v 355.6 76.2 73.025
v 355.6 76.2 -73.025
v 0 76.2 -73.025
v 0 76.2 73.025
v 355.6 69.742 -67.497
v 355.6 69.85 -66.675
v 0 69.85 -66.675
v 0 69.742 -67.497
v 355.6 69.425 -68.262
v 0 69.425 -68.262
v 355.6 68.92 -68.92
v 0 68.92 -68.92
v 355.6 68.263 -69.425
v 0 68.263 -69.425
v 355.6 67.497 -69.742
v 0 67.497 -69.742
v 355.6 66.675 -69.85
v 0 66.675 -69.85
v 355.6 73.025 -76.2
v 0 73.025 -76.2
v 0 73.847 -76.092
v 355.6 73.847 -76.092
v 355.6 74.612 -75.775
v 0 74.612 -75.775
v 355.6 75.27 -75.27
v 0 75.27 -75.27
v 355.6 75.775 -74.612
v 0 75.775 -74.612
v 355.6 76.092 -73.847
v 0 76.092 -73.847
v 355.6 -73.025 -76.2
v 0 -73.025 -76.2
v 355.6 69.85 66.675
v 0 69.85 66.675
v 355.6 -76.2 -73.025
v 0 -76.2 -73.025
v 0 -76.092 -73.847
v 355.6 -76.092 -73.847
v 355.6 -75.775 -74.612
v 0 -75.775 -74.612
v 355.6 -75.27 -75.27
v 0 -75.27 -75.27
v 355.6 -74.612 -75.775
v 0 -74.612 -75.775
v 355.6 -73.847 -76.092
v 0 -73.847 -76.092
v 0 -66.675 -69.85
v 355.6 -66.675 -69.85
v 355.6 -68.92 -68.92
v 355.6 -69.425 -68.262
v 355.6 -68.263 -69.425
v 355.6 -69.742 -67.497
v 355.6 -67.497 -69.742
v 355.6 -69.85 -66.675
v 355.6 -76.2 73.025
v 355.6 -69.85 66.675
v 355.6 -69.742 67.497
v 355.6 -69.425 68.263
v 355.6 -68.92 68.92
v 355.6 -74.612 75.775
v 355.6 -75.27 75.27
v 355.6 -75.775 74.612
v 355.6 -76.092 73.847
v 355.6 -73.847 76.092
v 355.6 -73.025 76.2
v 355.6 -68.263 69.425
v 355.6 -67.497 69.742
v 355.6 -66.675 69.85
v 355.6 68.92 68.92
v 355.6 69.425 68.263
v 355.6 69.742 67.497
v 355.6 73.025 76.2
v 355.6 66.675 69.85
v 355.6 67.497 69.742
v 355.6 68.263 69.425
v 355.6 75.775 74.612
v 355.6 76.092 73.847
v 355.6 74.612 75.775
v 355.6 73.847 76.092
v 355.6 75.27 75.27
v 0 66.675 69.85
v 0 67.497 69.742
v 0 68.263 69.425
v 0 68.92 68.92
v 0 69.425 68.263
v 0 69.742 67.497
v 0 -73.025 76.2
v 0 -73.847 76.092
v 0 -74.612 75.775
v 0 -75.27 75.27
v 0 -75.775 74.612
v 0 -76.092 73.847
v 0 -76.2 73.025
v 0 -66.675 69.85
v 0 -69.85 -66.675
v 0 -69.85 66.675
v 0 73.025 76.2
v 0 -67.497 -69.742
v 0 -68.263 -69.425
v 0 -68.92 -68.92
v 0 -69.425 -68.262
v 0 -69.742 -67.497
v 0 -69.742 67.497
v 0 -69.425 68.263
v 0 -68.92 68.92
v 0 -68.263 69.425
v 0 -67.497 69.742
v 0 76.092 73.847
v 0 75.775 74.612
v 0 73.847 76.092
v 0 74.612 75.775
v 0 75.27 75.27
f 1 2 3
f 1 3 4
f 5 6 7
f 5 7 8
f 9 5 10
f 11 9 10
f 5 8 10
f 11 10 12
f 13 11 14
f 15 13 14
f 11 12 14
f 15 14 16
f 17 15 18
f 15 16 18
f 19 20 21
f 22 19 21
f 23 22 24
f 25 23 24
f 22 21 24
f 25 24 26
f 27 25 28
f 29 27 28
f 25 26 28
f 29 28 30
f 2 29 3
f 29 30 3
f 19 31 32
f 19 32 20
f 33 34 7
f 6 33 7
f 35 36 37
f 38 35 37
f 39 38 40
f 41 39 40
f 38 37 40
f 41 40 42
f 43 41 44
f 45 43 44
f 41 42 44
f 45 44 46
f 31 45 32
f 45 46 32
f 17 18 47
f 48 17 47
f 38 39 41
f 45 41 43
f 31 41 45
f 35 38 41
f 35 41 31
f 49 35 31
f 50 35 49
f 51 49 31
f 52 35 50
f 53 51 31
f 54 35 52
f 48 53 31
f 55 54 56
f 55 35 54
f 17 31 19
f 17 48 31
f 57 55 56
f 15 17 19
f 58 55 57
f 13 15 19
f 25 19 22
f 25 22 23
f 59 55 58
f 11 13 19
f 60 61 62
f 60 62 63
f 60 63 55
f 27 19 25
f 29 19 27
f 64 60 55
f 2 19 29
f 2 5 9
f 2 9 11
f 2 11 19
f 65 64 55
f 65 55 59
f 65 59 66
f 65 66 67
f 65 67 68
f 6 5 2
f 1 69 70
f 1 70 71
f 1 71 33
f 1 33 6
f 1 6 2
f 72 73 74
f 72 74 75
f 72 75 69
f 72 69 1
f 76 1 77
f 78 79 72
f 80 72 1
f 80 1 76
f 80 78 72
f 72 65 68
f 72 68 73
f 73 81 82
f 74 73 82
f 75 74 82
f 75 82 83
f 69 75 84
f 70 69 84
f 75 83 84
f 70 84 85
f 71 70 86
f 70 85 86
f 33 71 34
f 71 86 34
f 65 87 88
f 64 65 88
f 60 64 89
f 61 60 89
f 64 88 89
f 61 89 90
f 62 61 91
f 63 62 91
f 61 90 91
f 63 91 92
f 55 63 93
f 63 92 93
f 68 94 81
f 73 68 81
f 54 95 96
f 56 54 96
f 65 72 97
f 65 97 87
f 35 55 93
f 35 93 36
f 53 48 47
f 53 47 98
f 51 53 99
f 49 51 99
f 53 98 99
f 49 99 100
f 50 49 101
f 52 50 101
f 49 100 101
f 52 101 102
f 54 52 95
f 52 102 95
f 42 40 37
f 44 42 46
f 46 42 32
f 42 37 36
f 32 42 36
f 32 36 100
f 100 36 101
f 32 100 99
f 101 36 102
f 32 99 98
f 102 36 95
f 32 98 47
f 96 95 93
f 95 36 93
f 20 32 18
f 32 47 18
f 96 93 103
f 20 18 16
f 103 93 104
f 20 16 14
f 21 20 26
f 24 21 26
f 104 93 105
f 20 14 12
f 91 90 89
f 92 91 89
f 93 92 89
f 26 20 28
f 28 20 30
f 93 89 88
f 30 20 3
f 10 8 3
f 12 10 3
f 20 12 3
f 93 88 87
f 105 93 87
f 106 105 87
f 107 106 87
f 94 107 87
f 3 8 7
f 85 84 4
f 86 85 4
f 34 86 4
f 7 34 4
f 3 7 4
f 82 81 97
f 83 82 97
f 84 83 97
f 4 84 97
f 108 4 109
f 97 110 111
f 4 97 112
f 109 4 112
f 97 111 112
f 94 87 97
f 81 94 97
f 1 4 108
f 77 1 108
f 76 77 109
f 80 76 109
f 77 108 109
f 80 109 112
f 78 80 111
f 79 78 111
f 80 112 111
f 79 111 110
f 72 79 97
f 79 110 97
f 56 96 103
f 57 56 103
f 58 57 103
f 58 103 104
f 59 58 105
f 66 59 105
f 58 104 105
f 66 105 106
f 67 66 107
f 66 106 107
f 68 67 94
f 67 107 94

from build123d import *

# Parameters (mm, degrees)
F1_DEPTH = 355.6


with BuildPart() as f1:
    # F0 (on Right) → F1 (new body)
    with BuildSketch(Plane.YZ):
        with BuildLine():
            Line((73.025, 76.2), (-73.025, 76.2))
            ThreePointArc((-73.025, 76.2), (-75.270064, 75.270064), (-76.2, 73.025))
            Line((-76.2, 73.025), (-76.2, -73.025))
            ThreePointArc((-76.2, -73.025), (-75.270064, -75.270064), (-73.025, -76.2))
            Line((-73.025, -76.2), (73.025, -76.2))
            ThreePointArc((73.025, -76.2), (75.270064, -75.270064), (76.2, -73.025))
            Line((76.2, -73.025), (76.2, 73.025))
            ThreePointArc((76.2, 73.025), (75.270064, 75.270064), (73.025, 76.2))
        make_face()
        with BuildLine():
            Line((-69.850001, -66.674999), (-69.850001, 66.675001))
            ThreePointArc((-69.850001, 66.675001), (-68.920065, 68.920065), (-66.675001, 69.850001))
            Line((-66.675001, 69.850001), (66.675001, 69.850001))
            ThreePointArc((66.675001, 69.850001), (68.920065, 68.920065), (69.850001, 66.675001))
            Line((69.850001, 66.675001), (69.850001, -66.674999))
            ThreePointArc((69.850001, -66.674999), (68.920065, -68.920063), (66.675001, -69.849999))
            Line((66.675001, -69.849999), (-66.675001, -69.849999))
            ThreePointArc((-66.675001, -69.849999), (-68.920065, -68.920063), (-69.850001, -66.674999))
        make_face(mode=Mode.SUBTRACT)
    extrude(amount=F1_DEPTH)


solid = f1.part
